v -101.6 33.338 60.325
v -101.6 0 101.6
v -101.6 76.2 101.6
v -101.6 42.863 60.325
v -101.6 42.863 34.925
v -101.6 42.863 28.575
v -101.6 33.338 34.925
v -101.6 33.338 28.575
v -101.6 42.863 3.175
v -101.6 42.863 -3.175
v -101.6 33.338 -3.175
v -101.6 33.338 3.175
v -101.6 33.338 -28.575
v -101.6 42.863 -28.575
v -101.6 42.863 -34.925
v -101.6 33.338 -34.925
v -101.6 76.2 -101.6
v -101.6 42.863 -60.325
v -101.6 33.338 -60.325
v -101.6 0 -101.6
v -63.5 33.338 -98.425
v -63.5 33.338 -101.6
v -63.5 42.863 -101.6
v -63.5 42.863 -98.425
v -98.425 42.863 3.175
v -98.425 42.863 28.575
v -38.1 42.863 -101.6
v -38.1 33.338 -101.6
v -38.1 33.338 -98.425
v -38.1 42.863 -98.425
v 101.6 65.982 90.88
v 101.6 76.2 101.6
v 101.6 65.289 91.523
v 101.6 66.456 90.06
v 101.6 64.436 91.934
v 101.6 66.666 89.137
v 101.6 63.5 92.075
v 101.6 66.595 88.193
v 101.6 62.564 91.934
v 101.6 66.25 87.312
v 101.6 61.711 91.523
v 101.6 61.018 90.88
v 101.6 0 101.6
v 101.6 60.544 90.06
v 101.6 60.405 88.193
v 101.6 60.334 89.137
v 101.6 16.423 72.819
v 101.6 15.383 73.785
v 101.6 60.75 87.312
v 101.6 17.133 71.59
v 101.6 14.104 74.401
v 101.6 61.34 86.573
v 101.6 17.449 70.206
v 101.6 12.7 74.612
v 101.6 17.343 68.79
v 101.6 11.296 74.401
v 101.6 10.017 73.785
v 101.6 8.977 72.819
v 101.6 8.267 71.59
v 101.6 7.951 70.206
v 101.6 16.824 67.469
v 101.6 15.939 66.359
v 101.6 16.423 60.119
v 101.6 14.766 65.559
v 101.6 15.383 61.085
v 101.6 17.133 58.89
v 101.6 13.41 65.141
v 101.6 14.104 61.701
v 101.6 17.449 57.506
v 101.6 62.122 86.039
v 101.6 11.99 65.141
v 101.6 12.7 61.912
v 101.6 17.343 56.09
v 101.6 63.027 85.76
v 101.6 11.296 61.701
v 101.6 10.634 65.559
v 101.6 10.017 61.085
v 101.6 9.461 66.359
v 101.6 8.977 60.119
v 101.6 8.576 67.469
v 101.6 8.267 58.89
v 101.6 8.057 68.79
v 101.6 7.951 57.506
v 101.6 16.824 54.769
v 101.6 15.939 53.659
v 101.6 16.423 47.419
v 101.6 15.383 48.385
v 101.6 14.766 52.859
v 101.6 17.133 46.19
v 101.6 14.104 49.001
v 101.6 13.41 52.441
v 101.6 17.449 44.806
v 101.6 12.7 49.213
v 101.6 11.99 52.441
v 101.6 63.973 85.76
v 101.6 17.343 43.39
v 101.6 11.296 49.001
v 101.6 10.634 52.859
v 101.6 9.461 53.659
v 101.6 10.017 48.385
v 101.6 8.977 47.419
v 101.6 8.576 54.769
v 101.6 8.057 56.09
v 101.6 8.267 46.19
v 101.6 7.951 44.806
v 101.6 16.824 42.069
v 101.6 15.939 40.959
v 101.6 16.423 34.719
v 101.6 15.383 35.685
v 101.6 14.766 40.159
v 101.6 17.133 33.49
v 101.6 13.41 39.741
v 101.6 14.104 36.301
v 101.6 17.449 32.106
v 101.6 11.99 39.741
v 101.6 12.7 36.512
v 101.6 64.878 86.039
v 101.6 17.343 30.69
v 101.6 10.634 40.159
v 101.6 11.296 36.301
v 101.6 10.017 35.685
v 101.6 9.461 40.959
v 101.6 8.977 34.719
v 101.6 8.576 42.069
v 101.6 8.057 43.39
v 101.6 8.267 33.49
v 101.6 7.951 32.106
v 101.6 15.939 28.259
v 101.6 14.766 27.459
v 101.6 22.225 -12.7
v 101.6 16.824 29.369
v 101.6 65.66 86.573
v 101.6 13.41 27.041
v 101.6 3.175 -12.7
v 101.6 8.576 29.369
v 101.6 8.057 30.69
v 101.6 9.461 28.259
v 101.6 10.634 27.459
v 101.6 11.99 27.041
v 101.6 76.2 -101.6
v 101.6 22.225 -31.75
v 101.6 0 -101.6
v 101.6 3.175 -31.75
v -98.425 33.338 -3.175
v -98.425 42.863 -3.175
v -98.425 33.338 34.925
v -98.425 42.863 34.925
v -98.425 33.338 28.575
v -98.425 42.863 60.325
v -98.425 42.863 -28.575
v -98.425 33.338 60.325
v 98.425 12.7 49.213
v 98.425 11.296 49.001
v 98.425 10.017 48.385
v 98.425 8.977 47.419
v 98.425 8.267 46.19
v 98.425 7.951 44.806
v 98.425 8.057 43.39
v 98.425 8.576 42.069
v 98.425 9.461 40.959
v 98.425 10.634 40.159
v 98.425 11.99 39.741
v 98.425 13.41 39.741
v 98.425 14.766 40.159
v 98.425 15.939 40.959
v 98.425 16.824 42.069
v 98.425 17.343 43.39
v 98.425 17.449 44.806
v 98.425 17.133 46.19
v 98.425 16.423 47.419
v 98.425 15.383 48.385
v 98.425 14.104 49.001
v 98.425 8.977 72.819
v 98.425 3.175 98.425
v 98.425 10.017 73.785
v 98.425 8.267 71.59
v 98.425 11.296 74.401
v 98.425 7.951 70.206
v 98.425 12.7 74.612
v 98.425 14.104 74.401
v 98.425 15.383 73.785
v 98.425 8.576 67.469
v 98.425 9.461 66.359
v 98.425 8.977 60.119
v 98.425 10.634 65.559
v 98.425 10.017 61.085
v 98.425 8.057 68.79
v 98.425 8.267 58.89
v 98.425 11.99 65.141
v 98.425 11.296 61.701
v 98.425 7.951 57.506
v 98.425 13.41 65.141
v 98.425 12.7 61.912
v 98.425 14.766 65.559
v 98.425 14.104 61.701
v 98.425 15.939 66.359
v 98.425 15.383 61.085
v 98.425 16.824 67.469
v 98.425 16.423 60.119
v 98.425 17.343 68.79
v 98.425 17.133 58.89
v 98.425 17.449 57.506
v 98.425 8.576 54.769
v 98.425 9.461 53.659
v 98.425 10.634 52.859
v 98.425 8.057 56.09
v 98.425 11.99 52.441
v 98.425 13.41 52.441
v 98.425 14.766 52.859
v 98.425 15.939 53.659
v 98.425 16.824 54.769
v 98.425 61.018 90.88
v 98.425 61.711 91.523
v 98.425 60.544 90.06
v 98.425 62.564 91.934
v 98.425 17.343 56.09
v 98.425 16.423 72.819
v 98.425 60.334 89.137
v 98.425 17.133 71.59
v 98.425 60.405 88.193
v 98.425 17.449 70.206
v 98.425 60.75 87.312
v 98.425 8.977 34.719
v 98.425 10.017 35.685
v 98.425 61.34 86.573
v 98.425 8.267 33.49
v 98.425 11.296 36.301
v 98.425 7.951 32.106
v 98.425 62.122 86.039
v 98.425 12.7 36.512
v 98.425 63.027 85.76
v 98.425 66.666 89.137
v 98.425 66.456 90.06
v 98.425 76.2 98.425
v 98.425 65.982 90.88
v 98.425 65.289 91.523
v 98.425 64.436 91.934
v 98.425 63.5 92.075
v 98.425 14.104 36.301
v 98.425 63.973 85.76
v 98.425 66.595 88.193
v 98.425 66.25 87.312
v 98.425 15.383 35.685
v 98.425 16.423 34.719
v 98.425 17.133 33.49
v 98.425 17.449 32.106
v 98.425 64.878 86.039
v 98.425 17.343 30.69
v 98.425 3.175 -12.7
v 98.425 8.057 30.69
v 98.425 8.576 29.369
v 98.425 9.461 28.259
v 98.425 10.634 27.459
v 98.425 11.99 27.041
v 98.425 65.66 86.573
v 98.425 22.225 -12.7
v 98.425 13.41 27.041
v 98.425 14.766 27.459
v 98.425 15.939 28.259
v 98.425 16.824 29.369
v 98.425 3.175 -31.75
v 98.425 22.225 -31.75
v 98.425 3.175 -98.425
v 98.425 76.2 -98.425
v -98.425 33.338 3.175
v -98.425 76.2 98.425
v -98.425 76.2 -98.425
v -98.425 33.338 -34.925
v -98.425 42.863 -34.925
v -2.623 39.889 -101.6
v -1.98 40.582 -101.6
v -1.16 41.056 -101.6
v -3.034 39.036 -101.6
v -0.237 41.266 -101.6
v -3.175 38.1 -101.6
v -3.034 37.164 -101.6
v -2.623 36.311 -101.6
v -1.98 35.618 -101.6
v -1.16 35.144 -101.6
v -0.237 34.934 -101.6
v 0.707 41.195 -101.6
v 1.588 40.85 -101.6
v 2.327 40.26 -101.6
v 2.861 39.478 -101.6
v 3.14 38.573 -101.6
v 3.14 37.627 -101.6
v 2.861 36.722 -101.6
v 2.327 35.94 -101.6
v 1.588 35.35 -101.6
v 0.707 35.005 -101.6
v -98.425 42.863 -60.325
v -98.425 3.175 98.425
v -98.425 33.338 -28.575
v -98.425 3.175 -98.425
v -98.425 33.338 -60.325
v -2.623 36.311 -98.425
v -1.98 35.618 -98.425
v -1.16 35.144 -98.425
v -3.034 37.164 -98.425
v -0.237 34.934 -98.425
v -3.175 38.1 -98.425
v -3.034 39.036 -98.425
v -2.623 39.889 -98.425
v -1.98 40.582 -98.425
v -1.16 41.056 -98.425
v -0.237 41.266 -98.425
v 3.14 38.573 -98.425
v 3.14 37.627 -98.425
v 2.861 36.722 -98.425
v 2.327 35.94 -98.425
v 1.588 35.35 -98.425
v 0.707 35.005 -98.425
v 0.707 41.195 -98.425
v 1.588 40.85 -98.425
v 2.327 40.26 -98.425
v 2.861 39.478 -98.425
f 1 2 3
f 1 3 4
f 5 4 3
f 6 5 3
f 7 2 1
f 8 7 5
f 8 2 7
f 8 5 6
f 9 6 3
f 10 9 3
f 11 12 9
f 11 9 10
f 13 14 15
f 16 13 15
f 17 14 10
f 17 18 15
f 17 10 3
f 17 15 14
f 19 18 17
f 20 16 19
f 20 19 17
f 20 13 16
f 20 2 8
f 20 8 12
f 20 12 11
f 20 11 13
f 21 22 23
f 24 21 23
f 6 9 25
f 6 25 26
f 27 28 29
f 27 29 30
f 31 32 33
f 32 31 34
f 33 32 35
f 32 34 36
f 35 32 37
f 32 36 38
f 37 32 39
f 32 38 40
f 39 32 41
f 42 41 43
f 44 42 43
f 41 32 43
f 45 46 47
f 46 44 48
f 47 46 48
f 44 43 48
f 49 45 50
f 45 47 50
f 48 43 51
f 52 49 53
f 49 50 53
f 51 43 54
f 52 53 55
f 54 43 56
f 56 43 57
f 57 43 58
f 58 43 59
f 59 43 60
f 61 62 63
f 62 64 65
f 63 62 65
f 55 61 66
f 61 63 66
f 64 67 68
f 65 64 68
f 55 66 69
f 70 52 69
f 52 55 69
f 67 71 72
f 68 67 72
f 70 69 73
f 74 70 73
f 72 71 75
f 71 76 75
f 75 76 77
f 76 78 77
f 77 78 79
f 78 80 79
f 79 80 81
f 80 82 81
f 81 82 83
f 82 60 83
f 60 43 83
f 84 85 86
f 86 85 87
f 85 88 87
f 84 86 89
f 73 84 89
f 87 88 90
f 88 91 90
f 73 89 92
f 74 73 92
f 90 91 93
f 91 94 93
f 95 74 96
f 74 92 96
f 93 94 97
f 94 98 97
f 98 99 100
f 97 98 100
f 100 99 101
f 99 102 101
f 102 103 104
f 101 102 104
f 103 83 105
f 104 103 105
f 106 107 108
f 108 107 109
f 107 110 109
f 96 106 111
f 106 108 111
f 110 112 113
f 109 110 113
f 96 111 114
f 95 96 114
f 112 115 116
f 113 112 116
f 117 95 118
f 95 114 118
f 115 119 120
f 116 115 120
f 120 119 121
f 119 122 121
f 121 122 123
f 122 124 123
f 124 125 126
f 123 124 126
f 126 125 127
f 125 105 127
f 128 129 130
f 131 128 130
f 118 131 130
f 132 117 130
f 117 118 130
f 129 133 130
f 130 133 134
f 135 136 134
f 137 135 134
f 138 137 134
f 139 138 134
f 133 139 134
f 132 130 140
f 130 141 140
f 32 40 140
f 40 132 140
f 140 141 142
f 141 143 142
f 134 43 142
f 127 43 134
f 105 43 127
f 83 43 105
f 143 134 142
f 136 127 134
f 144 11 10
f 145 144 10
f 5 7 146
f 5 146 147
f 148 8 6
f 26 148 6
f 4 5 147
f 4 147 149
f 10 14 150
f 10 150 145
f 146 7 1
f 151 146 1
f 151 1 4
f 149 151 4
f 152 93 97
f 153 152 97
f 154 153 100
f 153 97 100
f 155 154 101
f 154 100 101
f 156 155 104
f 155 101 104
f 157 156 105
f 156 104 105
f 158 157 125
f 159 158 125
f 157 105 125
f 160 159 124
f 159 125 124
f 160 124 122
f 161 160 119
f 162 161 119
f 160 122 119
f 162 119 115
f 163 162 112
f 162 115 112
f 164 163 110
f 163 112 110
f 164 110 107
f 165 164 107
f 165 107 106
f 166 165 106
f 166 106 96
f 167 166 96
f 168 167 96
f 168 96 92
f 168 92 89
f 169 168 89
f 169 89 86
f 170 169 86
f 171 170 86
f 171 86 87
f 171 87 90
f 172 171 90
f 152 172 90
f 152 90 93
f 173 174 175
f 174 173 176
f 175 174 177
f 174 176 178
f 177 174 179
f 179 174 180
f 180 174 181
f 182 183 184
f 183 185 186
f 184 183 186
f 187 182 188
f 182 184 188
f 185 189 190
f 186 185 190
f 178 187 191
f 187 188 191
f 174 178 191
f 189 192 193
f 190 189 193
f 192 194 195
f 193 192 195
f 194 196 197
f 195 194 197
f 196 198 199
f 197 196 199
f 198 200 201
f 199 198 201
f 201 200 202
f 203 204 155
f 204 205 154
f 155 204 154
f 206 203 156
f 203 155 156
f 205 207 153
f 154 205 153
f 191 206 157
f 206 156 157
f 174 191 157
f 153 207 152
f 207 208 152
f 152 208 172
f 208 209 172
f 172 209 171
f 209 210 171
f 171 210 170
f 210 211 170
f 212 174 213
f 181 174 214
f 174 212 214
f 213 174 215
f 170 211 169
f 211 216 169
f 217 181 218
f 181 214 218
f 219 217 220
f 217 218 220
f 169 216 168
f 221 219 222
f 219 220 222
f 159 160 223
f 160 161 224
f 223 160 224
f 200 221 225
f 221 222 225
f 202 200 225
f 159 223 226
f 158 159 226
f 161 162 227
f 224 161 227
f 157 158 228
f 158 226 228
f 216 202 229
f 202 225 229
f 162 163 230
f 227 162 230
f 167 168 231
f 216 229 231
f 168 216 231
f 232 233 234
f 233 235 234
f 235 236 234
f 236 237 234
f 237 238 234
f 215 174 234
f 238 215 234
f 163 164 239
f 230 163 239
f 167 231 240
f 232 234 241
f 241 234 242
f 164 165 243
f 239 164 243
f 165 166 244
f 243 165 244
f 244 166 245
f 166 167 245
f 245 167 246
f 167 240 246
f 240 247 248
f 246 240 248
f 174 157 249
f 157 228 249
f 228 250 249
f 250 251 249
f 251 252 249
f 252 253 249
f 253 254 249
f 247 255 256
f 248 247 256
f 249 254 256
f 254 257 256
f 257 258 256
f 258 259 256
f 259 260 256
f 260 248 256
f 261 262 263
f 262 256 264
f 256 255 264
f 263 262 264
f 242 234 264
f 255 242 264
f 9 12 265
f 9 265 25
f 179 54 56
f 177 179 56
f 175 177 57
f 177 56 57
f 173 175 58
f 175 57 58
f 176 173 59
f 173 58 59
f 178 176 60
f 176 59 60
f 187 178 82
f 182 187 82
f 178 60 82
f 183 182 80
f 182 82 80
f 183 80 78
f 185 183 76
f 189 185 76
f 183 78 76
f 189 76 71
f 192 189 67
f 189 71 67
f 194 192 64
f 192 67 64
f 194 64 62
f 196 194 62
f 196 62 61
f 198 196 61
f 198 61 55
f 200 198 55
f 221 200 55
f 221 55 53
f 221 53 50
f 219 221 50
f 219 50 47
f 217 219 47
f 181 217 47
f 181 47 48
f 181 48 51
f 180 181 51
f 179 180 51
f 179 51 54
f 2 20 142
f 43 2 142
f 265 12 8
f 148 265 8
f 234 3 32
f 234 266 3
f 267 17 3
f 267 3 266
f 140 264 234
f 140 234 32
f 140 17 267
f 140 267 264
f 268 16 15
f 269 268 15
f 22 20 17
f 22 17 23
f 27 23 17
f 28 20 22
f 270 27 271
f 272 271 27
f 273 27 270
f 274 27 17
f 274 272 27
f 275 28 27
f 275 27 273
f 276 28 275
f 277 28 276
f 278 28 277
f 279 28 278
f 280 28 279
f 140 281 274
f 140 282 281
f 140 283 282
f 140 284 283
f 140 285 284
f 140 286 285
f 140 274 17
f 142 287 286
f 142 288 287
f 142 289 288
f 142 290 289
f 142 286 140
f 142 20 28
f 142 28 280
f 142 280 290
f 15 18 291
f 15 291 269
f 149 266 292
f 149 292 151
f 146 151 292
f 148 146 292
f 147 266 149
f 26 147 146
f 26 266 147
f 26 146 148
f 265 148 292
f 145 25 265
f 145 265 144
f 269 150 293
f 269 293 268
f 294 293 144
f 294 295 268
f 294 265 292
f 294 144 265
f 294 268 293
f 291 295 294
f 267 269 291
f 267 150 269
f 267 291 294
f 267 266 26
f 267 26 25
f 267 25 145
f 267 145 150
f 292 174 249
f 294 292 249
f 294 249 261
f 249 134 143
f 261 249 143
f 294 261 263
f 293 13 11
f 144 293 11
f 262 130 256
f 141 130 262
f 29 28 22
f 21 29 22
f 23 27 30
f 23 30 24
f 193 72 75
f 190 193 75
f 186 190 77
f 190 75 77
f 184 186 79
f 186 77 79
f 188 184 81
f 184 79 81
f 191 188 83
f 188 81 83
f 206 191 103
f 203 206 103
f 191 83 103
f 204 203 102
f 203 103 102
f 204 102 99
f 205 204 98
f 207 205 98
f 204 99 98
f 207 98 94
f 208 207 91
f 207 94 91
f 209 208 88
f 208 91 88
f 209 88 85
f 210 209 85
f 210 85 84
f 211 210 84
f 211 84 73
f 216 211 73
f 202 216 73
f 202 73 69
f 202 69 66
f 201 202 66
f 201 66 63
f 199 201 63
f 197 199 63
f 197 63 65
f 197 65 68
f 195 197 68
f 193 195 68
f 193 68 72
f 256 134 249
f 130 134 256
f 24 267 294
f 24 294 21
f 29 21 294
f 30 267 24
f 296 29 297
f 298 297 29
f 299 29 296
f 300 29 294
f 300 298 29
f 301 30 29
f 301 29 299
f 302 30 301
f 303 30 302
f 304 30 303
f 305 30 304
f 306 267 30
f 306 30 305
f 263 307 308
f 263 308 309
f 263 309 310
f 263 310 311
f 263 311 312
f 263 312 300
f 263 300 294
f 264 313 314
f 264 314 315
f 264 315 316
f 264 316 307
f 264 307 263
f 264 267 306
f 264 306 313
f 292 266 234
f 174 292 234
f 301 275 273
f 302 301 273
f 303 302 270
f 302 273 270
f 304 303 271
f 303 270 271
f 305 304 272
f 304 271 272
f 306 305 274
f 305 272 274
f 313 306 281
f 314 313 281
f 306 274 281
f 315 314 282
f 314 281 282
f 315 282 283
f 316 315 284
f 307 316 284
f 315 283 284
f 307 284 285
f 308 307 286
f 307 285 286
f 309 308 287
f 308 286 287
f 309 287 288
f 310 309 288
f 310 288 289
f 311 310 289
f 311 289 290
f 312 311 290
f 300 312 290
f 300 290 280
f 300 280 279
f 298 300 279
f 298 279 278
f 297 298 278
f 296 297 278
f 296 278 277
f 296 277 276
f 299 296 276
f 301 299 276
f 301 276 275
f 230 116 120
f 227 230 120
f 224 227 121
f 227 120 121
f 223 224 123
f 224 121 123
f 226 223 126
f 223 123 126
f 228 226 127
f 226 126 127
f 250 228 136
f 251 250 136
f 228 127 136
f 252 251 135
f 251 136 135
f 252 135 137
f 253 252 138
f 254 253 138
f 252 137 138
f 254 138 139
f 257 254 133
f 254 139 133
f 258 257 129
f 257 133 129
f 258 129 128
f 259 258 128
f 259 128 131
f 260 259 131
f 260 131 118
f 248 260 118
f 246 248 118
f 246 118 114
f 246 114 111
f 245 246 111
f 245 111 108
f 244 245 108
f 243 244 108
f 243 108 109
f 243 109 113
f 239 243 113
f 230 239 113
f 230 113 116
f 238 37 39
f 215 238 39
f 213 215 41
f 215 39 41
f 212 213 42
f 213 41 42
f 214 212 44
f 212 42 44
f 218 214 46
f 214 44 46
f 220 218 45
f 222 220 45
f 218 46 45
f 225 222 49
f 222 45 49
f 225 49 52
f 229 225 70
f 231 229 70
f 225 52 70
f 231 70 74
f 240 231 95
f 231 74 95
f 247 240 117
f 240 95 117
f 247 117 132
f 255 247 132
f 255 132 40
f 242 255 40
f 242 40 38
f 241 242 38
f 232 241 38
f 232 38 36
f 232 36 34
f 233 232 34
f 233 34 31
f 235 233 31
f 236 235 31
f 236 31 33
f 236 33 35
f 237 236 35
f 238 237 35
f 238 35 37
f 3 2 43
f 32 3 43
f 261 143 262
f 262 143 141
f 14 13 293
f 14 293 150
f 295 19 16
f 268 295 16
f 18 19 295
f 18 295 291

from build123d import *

# Parameters (mm, degrees)
SKETCH1_W                      = 203.2
SKETCH1_H                      = 203.2
BOSS_EXTRUDE1_DEPTH            = 76.2
SKETCH2_W                      = 196.85
SKETCH2_H                      = 196.85
CUT_EXTRUDE1_DEPTH             = 73.025
CUT_EXTRUDE2_REACH             = 241.623
SKETCH3_R                      = 4.7625
SKETCH3_R_2                    = 3.175
SKETCH3_W                      = 19.05
SKETCH3_H                      = 19.05
CUT_EXTRUDE2_DIRECTION_2_DEPTH = 240.623120754
CUT_EXTRUDE3_REACH             = 241.623
SKETCH4_R                      = 3.175
SKETCH4_W                      = 25.4
SKETCH4_H                      = 9.525
CUT_EXTRUDE4_REACH             = 241.623
SKETCH5_W                      = 25.4
SKETCH5_H                      = 9.525


with BuildPart() as part:
    # Sketch1 → Boss-Extrude1 (new body)
    with BuildSketch(Plane(origin=(0, 0, 0), x_dir=(1, 0, 0), z_dir=(0, 1, 0))):
        Rectangle(SKETCH1_W, SKETCH1_H)
    extrude(amount=BOSS_EXTRUDE1_DEPTH)

    # Sketch2 → Cut-Extrude1 (cut)
    with BuildSketch(Plane(origin=(0, 76.2, 0), x_dir=(1, 0, 0), z_dir=(0, 1, 0))):
        Rectangle(SKETCH2_W, SKETCH2_H)
    extrude(amount=-CUT_EXTRUDE1_DEPTH, mode=Mode.SUBTRACT)

    # Sketch3 → Cut-Extrude2 (cut, up to next)
    with BuildSketch(Plane(origin=(101.6, 0, 0), x_dir=(0, 0, -1), z_dir=(1, 0, 0)), mode=Mode.PRIVATE) as cut_extrude2_sk1:
        with Locations(Location((-69.85, 12.7, 0), (0, 0, 180))):
            Circle(SKETCH3_R)
    cut_extrude2_tool1 = extrude(cut_extrude2_sk1.sketch, amount=-CUT_EXTRUDE2_REACH, mode=Mode.PRIVATE) & part.part
    # Sketch3 → Cut-Extrude2 (cut, up to next)
    with BuildSketch(Plane(origin=(101.6, 0, 0), x_dir=(0, 0, -1), z_dir=(1, 0, 0)), mode=Mode.PRIVATE) as cut_extrude2_sk2:
        with Locations(Location((-57.15, 12.7, 0), (0, 0, 180))):
            Circle(SKETCH3_R)
    cut_extrude2_tool2 = extrude(cut_extrude2_sk2.sketch, amount=-CUT_EXTRUDE2_REACH, mode=Mode.PRIVATE) & part.part
    # Sketch3 → Cut-Extrude2 (cut, up to next)
    with BuildSketch(Plane(origin=(101.6, 0, 0), x_dir=(0, 0, -1), z_dir=(1, 0, 0)), mode=Mode.PRIVATE) as cut_extrude2_sk3:
        with Locations(Location((-44.45, 12.7, 0), (0, 0, 180))):
            Circle(SKETCH3_R)
    cut_extrude2_tool3 = extrude(cut_extrude2_sk3.sketch, amount=-CUT_EXTRUDE2_REACH, mode=Mode.PRIVATE) & part.part
    # Sketch3 → Cut-Extrude2 (cut, up to next)
    with BuildSketch(Plane(origin=(101.6, 0, 0), x_dir=(0, 0, -1), z_dir=(1, 0, 0)), mode=Mode.PRIVATE) as cut_extrude2_sk4:
        with Locations(Location((-31.75, 12.7, 0), (0, 0, 180))):
            Circle(SKETCH3_R)
    cut_extrude2_tool4 = extrude(cut_extrude2_sk4.sketch, amount=-CUT_EXTRUDE2_REACH, mode=Mode.PRIVATE) & part.part
    # Sketch3 → Cut-Extrude2 (cut, up to next)
    with BuildSketch(Plane(origin=(101.6, 0, 0), x_dir=(0, 0, -1), z_dir=(1, 0, 0)), mode=Mode.PRIVATE) as cut_extrude2_sk5:
        with Locations(Location((-88.9, 63.5, 0), (0, 0, 180))):
            Circle(SKETCH3_R_2)
    cut_extrude2_tool5 = extrude(cut_extrude2_sk5.sketch, amount=-CUT_EXTRUDE2_REACH, mode=Mode.PRIVATE) & part.part
    # Sketch3 → Cut-Extrude2 (cut, up to next)
    with BuildSketch(Plane(origin=(101.6, 0, 0), x_dir=(0, 0, -1), z_dir=(1, 0, 0)), mode=Mode.PRIVATE) as cut_extrude2_sk6:
        with Locations((22.225, 12.7)):
            Rectangle(SKETCH3_W, SKETCH3_H)
    cut_extrude2_tool6 = extrude(cut_extrude2_sk6.sketch, amount=-CUT_EXTRUDE2_REACH, mode=Mode.PRIVATE) & part.part
    add(cut_extrude2_tool1.solids().sort_by_distance((101.6, 12.7, 69.85))[0], mode=Mode.SUBTRACT)
    add(cut_extrude2_tool2.solids().sort_by_distance((101.6, 12.7, 57.15))[0], mode=Mode.SUBTRACT)
    add(cut_extrude2_tool3.solids().sort_by_distance((101.6, 12.7, 44.45))[0], mode=Mode.SUBTRACT)
    add(cut_extrude2_tool4.solids().sort_by_distance((101.6, 12.7, 31.75))[0], mode=Mode.SUBTRACT)
    add(cut_extrude2_tool5.solids().sort_by_distance((101.6, 63.5, 88.9))[0], mode=Mode.SUBTRACT)
    add(cut_extrude2_tool6.solids().sort_by_distance((101.6, 12.7, -22.225))[0], mode=Mode.SUBTRACT)

    # Sketch3 → Cut-Extrude2 direction 2 (cut)
    with BuildSketch(Plane(origin=(101.6, 0, 0), x_dir=(0, 0, -1), z_dir=(1, 0, 0))):
        with Locations(Location((-69.85, 12.7, 0), (0, 0, 180))):
            Circle(SKETCH3_R)
        with Locations(Location((-57.15, 12.7, 0), (0, 0, 180))):
            Circle(SKETCH3_R)
        with Locations(Location((-44.45, 12.7, 0), (0, 0, 180))):
            Circle(SKETCH3_R)
        with Locations(Location((-31.75, 12.7, 0), (0, 0, 180))):
            Circle(SKETCH3_R)
        with Locations(Location((-88.9, 63.5, 0), (0, 0, 180))):
            Circle(SKETCH3_R_2)
        with Locations((22.225, 12.7)):
            Rectangle(SKETCH3_W, SKETCH3_H)
    extrude(amount=CUT_EXTRUDE2_DIRECTION_2_DEPTH, mode=Mode.SUBTRACT)

    # Sketch4 → Cut-Extrude3 (cut, up to next)
    with BuildSketch(Plane(origin=(0, 0, -101.6), x_dir=(-1, 0, 0), z_dir=(0, 0, -1)), mode=Mode.PRIVATE) as cut_extrude3_sk1:
        with Locations((0, 38.1)):
            Circle(SKETCH4_R)
    cut_extrude3_tool1 = extrude(cut_extrude3_sk1.sketch, amount=-CUT_EXTRUDE3_REACH, mode=Mode.PRIVATE) & part.part
    # Sketch4 → Cut-Extrude3 (cut, up to next)
    with BuildSketch(Plane(origin=(0, 0, -101.6), x_dir=(-1, 0, 0), z_dir=(0, 0, -1)), mode=Mode.PRIVATE) as cut_extrude3_sk2:
        with Locations((50.8, 38.1)):
            Rectangle(SKETCH4_W, SKETCH4_H)
    cut_extrude3_tool2 = extrude(cut_extrude3_sk2.sketch, amount=-CUT_EXTRUDE3_REACH, mode=Mode.PRIVATE) & part.part
    add(cut_extrude3_tool1.solids().sort_by_distance((0, 38.1, -101.6))[0], mode=Mode.SUBTRACT)
    add(cut_extrude3_tool2.solids().sort_by_distance((-50.8, 38.1, -101.6))[0], mode=Mode.SUBTRACT)

    # Sketch5 → Cut-Extrude4 (cut, up to next)
    with BuildSketch(Plane.ZY.offset(101.6), mode=Mode.PRIVATE) as cut_extrude4_sk1:
        with Locations((-15.875, 38.1)):
            Rectangle(SKETCH5_W, SKETCH5_H)
    cut_extrude4_tool1 = extrude(cut_extrude4_sk1.sketch, amount=-CUT_EXTRUDE4_REACH, mode=Mode.PRIVATE) & part.part
    # Sketch5 → Cut-Extrude4 (cut, up to next)
    with BuildSketch(Plane.ZY.offset(101.6), mode=Mode.PRIVATE) as cut_extrude4_sk2:
        with Locations((-47.625, 38.1)):
            Rectangle(SKETCH5_W, SKETCH5_H)
    cut_extrude4_tool2 = extrude(cut_extrude4_sk2.sketch, amount=-CUT_EXTRUDE4_REACH, mode=Mode.PRIVATE) & part.part
    # Sketch5 → Cut-Extrude4 (cut, up to next)
    with BuildSketch(Plane.ZY.offset(101.6), mode=Mode.PRIVATE) as cut_extrude4_sk3:
        with Locations((47.625, 38.1)):
            Rectangle(SKETCH5_W, SKETCH5_H)
    cut_extrude4_tool3 = extrude(cut_extrude4_sk3.sketch, amount=-CUT_EXTRUDE4_REACH, mode=Mode.PRIVATE) & part.part
    # Sketch5 → Cut-Extrude4 (cut, up to next)
    with BuildSketch(Plane.ZY.offset(101.6), mode=Mode.PRIVATE) as cut_extrude4_sk4:
        with Locations((15.875, 38.1)):
            Rectangle(SKETCH5_W, SKETCH5_H)
    cut_extrude4_tool4 = extrude(cut_extrude4_sk4.sketch, amount=-CUT_EXTRUDE4_REACH, mode=Mode.PRIVATE) & part.part
    add(cut_extrude4_tool1.solids().sort_by_distance((-101.6, 38.1, -15.875))[0], mode=Mode.SUBTRACT)
    add(cut_extrude4_tool2.solids().sort_by_distance((-101.6, 38.1, -47.625))[0], mode=Mode.SUBTRACT)
    add(cut_extrude4_tool3.solids().sort_by_distance((-101.6, 38.1, 47.625))[0], mode=Mode.SUBTRACT)
    add(cut_extrude4_tool4.solids().sort_by_distance((-101.6, 38.1, 15.875))[0], mode=Mode.SUBTRACT)


solid = part.part
